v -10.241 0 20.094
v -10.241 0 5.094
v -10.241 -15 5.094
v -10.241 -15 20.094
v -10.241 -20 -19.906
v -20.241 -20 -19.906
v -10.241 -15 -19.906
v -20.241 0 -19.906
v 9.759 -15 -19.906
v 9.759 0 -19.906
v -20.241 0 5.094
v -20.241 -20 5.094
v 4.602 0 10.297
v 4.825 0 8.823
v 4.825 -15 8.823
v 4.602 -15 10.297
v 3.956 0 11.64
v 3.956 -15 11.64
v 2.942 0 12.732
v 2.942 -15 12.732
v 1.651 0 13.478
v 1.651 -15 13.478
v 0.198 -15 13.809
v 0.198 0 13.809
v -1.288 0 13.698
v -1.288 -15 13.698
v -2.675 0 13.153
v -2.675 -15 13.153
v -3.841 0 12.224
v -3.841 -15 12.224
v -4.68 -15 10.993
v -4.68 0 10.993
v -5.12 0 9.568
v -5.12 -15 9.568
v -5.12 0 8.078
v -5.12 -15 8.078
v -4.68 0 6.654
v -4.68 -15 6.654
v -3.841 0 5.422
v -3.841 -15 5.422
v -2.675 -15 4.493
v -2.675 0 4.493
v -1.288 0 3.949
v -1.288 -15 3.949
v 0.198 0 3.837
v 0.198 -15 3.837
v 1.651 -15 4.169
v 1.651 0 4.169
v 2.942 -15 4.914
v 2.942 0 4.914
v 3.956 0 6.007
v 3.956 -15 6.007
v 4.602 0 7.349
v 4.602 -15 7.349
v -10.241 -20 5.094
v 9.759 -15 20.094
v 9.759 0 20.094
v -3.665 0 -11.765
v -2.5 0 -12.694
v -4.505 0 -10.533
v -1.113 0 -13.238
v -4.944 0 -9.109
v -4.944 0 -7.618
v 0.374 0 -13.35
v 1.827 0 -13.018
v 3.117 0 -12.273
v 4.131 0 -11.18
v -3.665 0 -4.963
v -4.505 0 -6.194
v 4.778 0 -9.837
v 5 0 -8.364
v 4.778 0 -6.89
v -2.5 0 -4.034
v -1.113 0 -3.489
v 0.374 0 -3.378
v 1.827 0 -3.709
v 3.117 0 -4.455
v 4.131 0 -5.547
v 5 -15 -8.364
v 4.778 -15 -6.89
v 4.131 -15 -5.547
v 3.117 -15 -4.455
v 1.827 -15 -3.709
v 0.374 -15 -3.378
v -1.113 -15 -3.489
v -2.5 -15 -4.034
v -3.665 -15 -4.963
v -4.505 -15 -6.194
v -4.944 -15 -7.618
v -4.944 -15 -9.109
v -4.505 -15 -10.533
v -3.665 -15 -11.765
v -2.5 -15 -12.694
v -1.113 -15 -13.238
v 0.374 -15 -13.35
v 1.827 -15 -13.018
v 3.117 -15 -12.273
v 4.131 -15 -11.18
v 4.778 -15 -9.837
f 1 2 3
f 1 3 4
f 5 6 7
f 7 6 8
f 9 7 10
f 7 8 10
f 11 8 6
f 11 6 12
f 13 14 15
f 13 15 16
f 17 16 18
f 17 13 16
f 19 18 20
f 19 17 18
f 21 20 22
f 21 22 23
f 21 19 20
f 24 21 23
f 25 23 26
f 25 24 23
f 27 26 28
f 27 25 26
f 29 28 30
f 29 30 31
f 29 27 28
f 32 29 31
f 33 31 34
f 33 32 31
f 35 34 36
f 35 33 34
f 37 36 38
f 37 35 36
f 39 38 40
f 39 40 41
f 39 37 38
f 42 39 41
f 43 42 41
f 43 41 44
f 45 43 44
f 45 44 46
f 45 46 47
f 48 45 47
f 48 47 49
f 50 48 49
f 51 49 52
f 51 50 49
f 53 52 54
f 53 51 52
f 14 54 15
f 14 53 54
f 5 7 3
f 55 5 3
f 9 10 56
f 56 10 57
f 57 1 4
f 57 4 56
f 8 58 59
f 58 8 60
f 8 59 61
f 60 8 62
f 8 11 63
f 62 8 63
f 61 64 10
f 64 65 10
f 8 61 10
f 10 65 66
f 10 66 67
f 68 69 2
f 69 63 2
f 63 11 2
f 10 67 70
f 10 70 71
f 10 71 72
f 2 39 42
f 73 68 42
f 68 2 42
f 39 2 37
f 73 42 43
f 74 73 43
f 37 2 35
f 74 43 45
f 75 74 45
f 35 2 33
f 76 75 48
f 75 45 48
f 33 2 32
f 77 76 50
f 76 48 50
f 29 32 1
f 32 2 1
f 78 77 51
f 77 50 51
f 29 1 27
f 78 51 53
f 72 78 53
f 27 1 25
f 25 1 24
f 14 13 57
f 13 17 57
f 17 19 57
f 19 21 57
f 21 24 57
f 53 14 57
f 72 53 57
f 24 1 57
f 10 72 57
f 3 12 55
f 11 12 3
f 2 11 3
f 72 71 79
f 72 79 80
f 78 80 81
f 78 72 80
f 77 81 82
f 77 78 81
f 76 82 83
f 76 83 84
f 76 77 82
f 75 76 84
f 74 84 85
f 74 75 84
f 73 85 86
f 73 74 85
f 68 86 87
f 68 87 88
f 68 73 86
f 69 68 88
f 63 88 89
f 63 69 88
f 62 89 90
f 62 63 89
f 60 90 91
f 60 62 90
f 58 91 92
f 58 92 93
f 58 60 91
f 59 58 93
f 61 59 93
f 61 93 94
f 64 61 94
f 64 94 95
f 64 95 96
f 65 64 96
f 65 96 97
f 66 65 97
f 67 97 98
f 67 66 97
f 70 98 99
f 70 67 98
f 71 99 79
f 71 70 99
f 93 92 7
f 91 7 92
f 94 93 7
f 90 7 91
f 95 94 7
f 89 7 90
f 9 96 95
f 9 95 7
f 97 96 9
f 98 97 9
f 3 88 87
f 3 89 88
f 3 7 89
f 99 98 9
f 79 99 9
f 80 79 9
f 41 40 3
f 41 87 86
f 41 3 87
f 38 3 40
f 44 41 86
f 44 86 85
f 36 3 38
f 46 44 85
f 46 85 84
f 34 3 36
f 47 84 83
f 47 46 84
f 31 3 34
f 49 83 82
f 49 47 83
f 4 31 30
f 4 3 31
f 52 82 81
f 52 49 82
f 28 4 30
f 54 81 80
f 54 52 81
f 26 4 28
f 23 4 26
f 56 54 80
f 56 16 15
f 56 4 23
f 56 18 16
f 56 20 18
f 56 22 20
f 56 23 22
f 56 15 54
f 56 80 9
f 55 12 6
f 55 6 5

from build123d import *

# Parameters (mm, degrees)
F0_W     = 20
F0_H     = 40
F0_R     = 5
F1_DEPTH = 15
F2_W     = 10
F2_H     = 25
F3_DEPTH = 20


with BuildPart() as f1:
    # F0 (on Front) → F1 (new body)
    with BuildSketch(Plane.XZ):
        with Locations((-0.241439, 0.093972)):
            Rectangle(F0_W, F0_H)
        with Locations((0, -8.363663)):
            Circle(F0_R, mode=Mode.SUBTRACT)
        with Locations((-0.175462, 8.823225)):
            Circle(F0_R, mode=Mode.SUBTRACT)
    extrude(amount=F1_DEPTH)

    # F2 (on Front) → F3 (join)
    with BuildSketch(Plane.XZ):
        with Locations((-15.241439, -7.406028)):
            Rectangle(F2_W, F2_H)
    extrude(amount=F3_DEPTH)


solid = f1.part
